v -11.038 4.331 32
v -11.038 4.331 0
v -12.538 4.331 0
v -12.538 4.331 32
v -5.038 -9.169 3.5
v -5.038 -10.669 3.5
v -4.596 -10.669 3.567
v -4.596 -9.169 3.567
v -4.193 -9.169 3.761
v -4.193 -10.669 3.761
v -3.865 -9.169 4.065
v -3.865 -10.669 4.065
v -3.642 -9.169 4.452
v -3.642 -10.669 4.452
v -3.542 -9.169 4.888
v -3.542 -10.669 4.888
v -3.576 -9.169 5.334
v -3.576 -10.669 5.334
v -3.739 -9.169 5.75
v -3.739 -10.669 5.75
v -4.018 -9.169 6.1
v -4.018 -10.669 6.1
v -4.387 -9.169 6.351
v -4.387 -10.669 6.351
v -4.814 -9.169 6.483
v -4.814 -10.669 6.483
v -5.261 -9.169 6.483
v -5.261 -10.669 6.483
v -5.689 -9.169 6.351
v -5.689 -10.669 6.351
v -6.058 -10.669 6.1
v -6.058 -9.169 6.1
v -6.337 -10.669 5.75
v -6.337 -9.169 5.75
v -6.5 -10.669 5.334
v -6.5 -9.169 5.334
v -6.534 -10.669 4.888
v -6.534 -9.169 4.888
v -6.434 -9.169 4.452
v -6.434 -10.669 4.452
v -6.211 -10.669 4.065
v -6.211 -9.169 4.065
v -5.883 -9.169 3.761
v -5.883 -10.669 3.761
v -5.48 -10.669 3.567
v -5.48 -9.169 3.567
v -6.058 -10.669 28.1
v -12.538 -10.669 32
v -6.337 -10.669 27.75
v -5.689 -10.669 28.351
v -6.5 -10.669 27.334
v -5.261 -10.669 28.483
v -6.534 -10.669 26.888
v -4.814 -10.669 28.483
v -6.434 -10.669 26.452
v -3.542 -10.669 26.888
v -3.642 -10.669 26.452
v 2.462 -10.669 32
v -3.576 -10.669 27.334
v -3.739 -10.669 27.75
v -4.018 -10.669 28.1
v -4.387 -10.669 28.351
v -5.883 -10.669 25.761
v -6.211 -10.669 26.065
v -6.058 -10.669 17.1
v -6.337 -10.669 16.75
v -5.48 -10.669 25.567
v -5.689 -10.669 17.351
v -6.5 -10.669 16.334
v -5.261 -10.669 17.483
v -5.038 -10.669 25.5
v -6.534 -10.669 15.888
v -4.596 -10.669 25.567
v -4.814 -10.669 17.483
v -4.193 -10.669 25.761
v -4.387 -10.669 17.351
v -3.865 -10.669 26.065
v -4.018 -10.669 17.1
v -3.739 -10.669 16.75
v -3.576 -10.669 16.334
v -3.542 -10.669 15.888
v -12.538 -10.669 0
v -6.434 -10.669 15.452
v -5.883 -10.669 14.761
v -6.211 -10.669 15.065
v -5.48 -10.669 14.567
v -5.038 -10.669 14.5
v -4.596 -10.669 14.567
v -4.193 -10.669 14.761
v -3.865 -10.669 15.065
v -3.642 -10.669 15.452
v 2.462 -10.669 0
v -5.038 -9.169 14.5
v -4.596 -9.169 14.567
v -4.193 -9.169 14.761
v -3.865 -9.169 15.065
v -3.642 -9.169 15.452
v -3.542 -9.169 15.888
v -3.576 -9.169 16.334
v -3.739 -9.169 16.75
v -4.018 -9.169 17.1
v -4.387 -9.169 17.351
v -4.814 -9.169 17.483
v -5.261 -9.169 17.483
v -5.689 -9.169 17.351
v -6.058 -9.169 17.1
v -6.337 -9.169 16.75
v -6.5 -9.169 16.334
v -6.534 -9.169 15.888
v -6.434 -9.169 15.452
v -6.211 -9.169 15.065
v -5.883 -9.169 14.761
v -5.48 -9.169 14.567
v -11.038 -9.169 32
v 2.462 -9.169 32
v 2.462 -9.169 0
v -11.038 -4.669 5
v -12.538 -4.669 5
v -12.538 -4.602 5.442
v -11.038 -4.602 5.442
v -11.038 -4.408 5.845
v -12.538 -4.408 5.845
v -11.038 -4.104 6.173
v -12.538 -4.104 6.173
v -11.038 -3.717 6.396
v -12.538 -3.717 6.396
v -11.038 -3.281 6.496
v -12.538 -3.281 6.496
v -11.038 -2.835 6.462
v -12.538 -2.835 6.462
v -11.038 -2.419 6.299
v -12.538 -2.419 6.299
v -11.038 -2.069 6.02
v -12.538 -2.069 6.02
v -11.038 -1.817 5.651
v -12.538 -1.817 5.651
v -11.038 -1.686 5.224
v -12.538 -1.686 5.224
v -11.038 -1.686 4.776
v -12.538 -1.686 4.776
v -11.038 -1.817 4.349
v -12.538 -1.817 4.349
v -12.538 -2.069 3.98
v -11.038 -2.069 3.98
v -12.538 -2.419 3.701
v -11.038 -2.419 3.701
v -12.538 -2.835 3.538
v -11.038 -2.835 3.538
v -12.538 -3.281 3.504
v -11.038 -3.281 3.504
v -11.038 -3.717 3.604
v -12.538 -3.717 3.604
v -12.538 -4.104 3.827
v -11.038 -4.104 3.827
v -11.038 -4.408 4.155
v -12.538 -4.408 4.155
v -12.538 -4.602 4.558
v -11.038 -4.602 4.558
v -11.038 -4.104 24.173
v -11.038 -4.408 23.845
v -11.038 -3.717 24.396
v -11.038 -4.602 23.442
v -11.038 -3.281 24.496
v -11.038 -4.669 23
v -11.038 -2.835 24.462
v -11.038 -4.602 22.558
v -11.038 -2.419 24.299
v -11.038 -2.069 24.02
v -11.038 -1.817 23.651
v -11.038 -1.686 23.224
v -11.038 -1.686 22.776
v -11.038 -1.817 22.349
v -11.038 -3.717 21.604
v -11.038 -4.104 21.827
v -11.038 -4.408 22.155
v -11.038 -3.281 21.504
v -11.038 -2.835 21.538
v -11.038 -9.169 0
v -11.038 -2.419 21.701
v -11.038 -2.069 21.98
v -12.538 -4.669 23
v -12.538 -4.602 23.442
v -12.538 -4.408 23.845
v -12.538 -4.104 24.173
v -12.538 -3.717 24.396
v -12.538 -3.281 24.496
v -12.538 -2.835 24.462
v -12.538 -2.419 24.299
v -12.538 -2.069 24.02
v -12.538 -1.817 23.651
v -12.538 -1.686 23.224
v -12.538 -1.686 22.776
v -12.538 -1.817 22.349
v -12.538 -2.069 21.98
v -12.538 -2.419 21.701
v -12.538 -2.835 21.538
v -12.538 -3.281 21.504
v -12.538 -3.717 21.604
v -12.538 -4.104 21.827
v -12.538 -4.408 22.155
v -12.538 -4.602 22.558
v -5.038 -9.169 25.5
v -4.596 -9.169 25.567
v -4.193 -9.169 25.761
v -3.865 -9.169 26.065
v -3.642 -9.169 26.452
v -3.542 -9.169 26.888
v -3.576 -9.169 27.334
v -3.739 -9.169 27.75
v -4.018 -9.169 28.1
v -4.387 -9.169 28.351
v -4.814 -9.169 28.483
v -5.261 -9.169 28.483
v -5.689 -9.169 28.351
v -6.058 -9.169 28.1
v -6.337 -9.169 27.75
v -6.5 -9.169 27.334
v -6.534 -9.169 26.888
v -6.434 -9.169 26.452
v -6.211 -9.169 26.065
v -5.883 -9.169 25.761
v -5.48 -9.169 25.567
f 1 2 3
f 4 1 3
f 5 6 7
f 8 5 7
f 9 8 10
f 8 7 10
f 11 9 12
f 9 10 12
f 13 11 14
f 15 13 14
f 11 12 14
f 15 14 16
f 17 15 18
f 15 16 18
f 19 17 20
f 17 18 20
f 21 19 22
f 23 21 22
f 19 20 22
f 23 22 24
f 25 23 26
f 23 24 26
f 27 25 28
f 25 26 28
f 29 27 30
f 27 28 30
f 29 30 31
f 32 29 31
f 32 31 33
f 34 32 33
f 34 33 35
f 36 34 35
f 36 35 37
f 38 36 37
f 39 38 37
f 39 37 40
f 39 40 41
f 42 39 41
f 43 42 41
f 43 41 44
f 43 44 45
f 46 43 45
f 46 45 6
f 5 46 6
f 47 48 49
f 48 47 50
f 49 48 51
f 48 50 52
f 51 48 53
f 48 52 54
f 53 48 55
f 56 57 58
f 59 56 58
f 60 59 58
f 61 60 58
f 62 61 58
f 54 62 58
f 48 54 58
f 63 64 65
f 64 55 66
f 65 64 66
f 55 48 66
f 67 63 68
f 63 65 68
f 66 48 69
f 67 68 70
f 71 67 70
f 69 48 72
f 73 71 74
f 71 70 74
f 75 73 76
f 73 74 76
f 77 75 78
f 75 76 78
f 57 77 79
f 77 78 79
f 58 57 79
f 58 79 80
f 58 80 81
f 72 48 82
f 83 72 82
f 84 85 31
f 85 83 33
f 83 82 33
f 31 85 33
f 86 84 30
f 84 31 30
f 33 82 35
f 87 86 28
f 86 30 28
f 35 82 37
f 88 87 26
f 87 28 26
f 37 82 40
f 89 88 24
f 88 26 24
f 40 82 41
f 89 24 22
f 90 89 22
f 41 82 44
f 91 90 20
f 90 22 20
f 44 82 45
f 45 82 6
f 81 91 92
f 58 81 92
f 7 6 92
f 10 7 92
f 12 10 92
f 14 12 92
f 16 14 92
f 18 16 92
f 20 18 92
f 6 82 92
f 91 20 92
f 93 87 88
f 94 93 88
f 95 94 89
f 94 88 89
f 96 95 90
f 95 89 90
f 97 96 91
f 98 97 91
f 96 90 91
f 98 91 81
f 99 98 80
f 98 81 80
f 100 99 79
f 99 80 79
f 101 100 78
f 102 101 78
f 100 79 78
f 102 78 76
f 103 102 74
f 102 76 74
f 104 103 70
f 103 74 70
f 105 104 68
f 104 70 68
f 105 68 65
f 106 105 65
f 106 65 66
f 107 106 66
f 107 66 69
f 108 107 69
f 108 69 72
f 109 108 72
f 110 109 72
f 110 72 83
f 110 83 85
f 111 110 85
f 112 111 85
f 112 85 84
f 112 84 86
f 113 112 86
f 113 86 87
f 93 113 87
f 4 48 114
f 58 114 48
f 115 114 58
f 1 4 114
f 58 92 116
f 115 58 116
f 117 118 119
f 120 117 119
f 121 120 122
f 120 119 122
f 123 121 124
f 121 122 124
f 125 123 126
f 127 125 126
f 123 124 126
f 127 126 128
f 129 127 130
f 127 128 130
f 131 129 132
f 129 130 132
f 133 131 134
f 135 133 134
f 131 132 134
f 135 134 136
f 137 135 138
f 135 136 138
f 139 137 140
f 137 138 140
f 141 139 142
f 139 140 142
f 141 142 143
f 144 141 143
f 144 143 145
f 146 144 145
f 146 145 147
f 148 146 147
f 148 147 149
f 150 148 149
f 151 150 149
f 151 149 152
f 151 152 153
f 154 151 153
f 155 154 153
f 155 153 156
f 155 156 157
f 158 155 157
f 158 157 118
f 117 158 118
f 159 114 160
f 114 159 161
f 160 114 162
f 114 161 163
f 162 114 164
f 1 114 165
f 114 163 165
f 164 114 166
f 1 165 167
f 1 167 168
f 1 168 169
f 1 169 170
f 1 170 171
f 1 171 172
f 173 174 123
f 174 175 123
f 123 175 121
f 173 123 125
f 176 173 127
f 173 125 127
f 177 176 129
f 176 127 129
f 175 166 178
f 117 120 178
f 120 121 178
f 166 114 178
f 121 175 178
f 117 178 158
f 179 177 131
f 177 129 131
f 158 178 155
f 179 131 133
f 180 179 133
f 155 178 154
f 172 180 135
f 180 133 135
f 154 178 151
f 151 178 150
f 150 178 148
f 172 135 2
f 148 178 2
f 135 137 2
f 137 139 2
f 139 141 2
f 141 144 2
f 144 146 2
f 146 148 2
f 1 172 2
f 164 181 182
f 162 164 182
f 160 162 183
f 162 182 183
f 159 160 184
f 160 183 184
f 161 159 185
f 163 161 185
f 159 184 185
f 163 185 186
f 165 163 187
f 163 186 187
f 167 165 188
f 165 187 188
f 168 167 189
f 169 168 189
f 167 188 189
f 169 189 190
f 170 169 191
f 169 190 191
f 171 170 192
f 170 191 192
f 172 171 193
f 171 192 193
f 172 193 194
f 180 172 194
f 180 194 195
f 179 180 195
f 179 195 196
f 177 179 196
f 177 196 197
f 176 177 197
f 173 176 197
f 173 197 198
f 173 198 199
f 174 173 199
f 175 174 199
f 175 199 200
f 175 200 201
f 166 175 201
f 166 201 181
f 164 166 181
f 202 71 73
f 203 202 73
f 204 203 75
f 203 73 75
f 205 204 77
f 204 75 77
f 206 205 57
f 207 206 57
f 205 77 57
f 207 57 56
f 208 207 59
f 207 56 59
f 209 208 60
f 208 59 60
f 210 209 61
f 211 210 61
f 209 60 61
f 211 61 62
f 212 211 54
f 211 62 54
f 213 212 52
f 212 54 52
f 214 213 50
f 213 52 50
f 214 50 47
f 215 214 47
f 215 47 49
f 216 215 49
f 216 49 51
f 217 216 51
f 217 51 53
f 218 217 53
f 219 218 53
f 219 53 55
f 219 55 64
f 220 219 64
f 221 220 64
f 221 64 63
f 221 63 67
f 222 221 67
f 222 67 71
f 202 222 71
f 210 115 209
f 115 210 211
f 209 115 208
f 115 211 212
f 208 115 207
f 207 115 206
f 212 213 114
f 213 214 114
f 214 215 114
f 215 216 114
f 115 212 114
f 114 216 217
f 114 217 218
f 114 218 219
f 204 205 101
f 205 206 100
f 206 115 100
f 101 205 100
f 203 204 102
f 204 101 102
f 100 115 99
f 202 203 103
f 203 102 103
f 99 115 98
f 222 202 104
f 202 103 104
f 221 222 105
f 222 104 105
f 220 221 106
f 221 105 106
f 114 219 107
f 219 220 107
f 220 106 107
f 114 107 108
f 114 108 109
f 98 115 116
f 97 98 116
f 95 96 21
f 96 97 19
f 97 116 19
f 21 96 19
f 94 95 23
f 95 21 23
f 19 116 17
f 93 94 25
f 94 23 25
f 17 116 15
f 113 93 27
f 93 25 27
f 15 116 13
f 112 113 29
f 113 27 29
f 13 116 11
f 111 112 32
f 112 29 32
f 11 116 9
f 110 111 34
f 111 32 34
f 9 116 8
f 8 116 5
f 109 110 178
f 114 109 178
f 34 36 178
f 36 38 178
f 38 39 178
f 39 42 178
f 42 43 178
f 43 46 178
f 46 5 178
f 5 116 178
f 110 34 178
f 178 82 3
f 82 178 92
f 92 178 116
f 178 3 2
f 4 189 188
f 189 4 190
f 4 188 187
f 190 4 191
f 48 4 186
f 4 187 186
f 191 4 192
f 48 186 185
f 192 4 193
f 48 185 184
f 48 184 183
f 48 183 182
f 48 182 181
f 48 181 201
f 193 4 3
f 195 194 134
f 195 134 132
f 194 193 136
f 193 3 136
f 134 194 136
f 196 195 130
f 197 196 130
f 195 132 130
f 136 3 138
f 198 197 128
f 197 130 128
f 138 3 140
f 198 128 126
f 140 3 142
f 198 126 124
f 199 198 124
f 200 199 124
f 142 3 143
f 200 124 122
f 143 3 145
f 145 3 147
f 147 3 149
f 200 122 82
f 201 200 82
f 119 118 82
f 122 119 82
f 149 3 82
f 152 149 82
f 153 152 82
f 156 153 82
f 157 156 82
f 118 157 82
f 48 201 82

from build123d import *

# Parameters (mm, degrees)
EXTRUSION1_DEPTH = 32
ESQUISSE2_R      = 1.5
EXTRUSION2_DEPTH = 25
ESQUISSE3_R      = 1.5
EXTRUSION3_DEPTH = 25


with BuildPart() as part:
    # Esquisse1 → Extrusion1 (new body)
    with BuildSketch(Plane.XY):
        Polygon((-12.537924369, 4.331190223), (-12.537924369, -10.668809777), (2.462075631, -10.668809777), (2.462075631, -9.168809777), (-11.037924369, -9.168809777), (-11.037924369, 4.331190223), align=None)
    extrude(amount=EXTRUSION1_DEPTH)

    # Esquisse2 → Extrusion2 (cut)
    with BuildSketch(Plane.ZY.offset(12.537924369)):
        with Locations(Location((23, -3.168809777, 0), (0, 0, 270))):
            Circle(ESQUISSE2_R)
        with Locations(Location((5, -3.168809777, 0), (0, 0, 270))):
            Circle(ESQUISSE2_R)
    extrude(amount=-EXTRUSION2_DEPTH, mode=Mode.SUBTRACT)

    # Esquisse3 → Extrusion3 (cut)
    with BuildSketch(Plane.XZ.offset(10.668809777)):
        with Locations(Location((-5.037924369, 5, 0), (0, 0, 270))):
            Circle(ESQUISSE3_R)
        with Locations(Location((-5.037924369, 27, 0), (0, 0, 270))):
            Circle(ESQUISSE3_R)
        with Locations(Location((-5.037924369, 16, 0), (0, 0, 270))):
            Circle(ESQUISSE3_R)
    extrude(amount=-EXTRUSION3_DEPTH, mode=Mode.SUBTRACT)


solid = part.part
